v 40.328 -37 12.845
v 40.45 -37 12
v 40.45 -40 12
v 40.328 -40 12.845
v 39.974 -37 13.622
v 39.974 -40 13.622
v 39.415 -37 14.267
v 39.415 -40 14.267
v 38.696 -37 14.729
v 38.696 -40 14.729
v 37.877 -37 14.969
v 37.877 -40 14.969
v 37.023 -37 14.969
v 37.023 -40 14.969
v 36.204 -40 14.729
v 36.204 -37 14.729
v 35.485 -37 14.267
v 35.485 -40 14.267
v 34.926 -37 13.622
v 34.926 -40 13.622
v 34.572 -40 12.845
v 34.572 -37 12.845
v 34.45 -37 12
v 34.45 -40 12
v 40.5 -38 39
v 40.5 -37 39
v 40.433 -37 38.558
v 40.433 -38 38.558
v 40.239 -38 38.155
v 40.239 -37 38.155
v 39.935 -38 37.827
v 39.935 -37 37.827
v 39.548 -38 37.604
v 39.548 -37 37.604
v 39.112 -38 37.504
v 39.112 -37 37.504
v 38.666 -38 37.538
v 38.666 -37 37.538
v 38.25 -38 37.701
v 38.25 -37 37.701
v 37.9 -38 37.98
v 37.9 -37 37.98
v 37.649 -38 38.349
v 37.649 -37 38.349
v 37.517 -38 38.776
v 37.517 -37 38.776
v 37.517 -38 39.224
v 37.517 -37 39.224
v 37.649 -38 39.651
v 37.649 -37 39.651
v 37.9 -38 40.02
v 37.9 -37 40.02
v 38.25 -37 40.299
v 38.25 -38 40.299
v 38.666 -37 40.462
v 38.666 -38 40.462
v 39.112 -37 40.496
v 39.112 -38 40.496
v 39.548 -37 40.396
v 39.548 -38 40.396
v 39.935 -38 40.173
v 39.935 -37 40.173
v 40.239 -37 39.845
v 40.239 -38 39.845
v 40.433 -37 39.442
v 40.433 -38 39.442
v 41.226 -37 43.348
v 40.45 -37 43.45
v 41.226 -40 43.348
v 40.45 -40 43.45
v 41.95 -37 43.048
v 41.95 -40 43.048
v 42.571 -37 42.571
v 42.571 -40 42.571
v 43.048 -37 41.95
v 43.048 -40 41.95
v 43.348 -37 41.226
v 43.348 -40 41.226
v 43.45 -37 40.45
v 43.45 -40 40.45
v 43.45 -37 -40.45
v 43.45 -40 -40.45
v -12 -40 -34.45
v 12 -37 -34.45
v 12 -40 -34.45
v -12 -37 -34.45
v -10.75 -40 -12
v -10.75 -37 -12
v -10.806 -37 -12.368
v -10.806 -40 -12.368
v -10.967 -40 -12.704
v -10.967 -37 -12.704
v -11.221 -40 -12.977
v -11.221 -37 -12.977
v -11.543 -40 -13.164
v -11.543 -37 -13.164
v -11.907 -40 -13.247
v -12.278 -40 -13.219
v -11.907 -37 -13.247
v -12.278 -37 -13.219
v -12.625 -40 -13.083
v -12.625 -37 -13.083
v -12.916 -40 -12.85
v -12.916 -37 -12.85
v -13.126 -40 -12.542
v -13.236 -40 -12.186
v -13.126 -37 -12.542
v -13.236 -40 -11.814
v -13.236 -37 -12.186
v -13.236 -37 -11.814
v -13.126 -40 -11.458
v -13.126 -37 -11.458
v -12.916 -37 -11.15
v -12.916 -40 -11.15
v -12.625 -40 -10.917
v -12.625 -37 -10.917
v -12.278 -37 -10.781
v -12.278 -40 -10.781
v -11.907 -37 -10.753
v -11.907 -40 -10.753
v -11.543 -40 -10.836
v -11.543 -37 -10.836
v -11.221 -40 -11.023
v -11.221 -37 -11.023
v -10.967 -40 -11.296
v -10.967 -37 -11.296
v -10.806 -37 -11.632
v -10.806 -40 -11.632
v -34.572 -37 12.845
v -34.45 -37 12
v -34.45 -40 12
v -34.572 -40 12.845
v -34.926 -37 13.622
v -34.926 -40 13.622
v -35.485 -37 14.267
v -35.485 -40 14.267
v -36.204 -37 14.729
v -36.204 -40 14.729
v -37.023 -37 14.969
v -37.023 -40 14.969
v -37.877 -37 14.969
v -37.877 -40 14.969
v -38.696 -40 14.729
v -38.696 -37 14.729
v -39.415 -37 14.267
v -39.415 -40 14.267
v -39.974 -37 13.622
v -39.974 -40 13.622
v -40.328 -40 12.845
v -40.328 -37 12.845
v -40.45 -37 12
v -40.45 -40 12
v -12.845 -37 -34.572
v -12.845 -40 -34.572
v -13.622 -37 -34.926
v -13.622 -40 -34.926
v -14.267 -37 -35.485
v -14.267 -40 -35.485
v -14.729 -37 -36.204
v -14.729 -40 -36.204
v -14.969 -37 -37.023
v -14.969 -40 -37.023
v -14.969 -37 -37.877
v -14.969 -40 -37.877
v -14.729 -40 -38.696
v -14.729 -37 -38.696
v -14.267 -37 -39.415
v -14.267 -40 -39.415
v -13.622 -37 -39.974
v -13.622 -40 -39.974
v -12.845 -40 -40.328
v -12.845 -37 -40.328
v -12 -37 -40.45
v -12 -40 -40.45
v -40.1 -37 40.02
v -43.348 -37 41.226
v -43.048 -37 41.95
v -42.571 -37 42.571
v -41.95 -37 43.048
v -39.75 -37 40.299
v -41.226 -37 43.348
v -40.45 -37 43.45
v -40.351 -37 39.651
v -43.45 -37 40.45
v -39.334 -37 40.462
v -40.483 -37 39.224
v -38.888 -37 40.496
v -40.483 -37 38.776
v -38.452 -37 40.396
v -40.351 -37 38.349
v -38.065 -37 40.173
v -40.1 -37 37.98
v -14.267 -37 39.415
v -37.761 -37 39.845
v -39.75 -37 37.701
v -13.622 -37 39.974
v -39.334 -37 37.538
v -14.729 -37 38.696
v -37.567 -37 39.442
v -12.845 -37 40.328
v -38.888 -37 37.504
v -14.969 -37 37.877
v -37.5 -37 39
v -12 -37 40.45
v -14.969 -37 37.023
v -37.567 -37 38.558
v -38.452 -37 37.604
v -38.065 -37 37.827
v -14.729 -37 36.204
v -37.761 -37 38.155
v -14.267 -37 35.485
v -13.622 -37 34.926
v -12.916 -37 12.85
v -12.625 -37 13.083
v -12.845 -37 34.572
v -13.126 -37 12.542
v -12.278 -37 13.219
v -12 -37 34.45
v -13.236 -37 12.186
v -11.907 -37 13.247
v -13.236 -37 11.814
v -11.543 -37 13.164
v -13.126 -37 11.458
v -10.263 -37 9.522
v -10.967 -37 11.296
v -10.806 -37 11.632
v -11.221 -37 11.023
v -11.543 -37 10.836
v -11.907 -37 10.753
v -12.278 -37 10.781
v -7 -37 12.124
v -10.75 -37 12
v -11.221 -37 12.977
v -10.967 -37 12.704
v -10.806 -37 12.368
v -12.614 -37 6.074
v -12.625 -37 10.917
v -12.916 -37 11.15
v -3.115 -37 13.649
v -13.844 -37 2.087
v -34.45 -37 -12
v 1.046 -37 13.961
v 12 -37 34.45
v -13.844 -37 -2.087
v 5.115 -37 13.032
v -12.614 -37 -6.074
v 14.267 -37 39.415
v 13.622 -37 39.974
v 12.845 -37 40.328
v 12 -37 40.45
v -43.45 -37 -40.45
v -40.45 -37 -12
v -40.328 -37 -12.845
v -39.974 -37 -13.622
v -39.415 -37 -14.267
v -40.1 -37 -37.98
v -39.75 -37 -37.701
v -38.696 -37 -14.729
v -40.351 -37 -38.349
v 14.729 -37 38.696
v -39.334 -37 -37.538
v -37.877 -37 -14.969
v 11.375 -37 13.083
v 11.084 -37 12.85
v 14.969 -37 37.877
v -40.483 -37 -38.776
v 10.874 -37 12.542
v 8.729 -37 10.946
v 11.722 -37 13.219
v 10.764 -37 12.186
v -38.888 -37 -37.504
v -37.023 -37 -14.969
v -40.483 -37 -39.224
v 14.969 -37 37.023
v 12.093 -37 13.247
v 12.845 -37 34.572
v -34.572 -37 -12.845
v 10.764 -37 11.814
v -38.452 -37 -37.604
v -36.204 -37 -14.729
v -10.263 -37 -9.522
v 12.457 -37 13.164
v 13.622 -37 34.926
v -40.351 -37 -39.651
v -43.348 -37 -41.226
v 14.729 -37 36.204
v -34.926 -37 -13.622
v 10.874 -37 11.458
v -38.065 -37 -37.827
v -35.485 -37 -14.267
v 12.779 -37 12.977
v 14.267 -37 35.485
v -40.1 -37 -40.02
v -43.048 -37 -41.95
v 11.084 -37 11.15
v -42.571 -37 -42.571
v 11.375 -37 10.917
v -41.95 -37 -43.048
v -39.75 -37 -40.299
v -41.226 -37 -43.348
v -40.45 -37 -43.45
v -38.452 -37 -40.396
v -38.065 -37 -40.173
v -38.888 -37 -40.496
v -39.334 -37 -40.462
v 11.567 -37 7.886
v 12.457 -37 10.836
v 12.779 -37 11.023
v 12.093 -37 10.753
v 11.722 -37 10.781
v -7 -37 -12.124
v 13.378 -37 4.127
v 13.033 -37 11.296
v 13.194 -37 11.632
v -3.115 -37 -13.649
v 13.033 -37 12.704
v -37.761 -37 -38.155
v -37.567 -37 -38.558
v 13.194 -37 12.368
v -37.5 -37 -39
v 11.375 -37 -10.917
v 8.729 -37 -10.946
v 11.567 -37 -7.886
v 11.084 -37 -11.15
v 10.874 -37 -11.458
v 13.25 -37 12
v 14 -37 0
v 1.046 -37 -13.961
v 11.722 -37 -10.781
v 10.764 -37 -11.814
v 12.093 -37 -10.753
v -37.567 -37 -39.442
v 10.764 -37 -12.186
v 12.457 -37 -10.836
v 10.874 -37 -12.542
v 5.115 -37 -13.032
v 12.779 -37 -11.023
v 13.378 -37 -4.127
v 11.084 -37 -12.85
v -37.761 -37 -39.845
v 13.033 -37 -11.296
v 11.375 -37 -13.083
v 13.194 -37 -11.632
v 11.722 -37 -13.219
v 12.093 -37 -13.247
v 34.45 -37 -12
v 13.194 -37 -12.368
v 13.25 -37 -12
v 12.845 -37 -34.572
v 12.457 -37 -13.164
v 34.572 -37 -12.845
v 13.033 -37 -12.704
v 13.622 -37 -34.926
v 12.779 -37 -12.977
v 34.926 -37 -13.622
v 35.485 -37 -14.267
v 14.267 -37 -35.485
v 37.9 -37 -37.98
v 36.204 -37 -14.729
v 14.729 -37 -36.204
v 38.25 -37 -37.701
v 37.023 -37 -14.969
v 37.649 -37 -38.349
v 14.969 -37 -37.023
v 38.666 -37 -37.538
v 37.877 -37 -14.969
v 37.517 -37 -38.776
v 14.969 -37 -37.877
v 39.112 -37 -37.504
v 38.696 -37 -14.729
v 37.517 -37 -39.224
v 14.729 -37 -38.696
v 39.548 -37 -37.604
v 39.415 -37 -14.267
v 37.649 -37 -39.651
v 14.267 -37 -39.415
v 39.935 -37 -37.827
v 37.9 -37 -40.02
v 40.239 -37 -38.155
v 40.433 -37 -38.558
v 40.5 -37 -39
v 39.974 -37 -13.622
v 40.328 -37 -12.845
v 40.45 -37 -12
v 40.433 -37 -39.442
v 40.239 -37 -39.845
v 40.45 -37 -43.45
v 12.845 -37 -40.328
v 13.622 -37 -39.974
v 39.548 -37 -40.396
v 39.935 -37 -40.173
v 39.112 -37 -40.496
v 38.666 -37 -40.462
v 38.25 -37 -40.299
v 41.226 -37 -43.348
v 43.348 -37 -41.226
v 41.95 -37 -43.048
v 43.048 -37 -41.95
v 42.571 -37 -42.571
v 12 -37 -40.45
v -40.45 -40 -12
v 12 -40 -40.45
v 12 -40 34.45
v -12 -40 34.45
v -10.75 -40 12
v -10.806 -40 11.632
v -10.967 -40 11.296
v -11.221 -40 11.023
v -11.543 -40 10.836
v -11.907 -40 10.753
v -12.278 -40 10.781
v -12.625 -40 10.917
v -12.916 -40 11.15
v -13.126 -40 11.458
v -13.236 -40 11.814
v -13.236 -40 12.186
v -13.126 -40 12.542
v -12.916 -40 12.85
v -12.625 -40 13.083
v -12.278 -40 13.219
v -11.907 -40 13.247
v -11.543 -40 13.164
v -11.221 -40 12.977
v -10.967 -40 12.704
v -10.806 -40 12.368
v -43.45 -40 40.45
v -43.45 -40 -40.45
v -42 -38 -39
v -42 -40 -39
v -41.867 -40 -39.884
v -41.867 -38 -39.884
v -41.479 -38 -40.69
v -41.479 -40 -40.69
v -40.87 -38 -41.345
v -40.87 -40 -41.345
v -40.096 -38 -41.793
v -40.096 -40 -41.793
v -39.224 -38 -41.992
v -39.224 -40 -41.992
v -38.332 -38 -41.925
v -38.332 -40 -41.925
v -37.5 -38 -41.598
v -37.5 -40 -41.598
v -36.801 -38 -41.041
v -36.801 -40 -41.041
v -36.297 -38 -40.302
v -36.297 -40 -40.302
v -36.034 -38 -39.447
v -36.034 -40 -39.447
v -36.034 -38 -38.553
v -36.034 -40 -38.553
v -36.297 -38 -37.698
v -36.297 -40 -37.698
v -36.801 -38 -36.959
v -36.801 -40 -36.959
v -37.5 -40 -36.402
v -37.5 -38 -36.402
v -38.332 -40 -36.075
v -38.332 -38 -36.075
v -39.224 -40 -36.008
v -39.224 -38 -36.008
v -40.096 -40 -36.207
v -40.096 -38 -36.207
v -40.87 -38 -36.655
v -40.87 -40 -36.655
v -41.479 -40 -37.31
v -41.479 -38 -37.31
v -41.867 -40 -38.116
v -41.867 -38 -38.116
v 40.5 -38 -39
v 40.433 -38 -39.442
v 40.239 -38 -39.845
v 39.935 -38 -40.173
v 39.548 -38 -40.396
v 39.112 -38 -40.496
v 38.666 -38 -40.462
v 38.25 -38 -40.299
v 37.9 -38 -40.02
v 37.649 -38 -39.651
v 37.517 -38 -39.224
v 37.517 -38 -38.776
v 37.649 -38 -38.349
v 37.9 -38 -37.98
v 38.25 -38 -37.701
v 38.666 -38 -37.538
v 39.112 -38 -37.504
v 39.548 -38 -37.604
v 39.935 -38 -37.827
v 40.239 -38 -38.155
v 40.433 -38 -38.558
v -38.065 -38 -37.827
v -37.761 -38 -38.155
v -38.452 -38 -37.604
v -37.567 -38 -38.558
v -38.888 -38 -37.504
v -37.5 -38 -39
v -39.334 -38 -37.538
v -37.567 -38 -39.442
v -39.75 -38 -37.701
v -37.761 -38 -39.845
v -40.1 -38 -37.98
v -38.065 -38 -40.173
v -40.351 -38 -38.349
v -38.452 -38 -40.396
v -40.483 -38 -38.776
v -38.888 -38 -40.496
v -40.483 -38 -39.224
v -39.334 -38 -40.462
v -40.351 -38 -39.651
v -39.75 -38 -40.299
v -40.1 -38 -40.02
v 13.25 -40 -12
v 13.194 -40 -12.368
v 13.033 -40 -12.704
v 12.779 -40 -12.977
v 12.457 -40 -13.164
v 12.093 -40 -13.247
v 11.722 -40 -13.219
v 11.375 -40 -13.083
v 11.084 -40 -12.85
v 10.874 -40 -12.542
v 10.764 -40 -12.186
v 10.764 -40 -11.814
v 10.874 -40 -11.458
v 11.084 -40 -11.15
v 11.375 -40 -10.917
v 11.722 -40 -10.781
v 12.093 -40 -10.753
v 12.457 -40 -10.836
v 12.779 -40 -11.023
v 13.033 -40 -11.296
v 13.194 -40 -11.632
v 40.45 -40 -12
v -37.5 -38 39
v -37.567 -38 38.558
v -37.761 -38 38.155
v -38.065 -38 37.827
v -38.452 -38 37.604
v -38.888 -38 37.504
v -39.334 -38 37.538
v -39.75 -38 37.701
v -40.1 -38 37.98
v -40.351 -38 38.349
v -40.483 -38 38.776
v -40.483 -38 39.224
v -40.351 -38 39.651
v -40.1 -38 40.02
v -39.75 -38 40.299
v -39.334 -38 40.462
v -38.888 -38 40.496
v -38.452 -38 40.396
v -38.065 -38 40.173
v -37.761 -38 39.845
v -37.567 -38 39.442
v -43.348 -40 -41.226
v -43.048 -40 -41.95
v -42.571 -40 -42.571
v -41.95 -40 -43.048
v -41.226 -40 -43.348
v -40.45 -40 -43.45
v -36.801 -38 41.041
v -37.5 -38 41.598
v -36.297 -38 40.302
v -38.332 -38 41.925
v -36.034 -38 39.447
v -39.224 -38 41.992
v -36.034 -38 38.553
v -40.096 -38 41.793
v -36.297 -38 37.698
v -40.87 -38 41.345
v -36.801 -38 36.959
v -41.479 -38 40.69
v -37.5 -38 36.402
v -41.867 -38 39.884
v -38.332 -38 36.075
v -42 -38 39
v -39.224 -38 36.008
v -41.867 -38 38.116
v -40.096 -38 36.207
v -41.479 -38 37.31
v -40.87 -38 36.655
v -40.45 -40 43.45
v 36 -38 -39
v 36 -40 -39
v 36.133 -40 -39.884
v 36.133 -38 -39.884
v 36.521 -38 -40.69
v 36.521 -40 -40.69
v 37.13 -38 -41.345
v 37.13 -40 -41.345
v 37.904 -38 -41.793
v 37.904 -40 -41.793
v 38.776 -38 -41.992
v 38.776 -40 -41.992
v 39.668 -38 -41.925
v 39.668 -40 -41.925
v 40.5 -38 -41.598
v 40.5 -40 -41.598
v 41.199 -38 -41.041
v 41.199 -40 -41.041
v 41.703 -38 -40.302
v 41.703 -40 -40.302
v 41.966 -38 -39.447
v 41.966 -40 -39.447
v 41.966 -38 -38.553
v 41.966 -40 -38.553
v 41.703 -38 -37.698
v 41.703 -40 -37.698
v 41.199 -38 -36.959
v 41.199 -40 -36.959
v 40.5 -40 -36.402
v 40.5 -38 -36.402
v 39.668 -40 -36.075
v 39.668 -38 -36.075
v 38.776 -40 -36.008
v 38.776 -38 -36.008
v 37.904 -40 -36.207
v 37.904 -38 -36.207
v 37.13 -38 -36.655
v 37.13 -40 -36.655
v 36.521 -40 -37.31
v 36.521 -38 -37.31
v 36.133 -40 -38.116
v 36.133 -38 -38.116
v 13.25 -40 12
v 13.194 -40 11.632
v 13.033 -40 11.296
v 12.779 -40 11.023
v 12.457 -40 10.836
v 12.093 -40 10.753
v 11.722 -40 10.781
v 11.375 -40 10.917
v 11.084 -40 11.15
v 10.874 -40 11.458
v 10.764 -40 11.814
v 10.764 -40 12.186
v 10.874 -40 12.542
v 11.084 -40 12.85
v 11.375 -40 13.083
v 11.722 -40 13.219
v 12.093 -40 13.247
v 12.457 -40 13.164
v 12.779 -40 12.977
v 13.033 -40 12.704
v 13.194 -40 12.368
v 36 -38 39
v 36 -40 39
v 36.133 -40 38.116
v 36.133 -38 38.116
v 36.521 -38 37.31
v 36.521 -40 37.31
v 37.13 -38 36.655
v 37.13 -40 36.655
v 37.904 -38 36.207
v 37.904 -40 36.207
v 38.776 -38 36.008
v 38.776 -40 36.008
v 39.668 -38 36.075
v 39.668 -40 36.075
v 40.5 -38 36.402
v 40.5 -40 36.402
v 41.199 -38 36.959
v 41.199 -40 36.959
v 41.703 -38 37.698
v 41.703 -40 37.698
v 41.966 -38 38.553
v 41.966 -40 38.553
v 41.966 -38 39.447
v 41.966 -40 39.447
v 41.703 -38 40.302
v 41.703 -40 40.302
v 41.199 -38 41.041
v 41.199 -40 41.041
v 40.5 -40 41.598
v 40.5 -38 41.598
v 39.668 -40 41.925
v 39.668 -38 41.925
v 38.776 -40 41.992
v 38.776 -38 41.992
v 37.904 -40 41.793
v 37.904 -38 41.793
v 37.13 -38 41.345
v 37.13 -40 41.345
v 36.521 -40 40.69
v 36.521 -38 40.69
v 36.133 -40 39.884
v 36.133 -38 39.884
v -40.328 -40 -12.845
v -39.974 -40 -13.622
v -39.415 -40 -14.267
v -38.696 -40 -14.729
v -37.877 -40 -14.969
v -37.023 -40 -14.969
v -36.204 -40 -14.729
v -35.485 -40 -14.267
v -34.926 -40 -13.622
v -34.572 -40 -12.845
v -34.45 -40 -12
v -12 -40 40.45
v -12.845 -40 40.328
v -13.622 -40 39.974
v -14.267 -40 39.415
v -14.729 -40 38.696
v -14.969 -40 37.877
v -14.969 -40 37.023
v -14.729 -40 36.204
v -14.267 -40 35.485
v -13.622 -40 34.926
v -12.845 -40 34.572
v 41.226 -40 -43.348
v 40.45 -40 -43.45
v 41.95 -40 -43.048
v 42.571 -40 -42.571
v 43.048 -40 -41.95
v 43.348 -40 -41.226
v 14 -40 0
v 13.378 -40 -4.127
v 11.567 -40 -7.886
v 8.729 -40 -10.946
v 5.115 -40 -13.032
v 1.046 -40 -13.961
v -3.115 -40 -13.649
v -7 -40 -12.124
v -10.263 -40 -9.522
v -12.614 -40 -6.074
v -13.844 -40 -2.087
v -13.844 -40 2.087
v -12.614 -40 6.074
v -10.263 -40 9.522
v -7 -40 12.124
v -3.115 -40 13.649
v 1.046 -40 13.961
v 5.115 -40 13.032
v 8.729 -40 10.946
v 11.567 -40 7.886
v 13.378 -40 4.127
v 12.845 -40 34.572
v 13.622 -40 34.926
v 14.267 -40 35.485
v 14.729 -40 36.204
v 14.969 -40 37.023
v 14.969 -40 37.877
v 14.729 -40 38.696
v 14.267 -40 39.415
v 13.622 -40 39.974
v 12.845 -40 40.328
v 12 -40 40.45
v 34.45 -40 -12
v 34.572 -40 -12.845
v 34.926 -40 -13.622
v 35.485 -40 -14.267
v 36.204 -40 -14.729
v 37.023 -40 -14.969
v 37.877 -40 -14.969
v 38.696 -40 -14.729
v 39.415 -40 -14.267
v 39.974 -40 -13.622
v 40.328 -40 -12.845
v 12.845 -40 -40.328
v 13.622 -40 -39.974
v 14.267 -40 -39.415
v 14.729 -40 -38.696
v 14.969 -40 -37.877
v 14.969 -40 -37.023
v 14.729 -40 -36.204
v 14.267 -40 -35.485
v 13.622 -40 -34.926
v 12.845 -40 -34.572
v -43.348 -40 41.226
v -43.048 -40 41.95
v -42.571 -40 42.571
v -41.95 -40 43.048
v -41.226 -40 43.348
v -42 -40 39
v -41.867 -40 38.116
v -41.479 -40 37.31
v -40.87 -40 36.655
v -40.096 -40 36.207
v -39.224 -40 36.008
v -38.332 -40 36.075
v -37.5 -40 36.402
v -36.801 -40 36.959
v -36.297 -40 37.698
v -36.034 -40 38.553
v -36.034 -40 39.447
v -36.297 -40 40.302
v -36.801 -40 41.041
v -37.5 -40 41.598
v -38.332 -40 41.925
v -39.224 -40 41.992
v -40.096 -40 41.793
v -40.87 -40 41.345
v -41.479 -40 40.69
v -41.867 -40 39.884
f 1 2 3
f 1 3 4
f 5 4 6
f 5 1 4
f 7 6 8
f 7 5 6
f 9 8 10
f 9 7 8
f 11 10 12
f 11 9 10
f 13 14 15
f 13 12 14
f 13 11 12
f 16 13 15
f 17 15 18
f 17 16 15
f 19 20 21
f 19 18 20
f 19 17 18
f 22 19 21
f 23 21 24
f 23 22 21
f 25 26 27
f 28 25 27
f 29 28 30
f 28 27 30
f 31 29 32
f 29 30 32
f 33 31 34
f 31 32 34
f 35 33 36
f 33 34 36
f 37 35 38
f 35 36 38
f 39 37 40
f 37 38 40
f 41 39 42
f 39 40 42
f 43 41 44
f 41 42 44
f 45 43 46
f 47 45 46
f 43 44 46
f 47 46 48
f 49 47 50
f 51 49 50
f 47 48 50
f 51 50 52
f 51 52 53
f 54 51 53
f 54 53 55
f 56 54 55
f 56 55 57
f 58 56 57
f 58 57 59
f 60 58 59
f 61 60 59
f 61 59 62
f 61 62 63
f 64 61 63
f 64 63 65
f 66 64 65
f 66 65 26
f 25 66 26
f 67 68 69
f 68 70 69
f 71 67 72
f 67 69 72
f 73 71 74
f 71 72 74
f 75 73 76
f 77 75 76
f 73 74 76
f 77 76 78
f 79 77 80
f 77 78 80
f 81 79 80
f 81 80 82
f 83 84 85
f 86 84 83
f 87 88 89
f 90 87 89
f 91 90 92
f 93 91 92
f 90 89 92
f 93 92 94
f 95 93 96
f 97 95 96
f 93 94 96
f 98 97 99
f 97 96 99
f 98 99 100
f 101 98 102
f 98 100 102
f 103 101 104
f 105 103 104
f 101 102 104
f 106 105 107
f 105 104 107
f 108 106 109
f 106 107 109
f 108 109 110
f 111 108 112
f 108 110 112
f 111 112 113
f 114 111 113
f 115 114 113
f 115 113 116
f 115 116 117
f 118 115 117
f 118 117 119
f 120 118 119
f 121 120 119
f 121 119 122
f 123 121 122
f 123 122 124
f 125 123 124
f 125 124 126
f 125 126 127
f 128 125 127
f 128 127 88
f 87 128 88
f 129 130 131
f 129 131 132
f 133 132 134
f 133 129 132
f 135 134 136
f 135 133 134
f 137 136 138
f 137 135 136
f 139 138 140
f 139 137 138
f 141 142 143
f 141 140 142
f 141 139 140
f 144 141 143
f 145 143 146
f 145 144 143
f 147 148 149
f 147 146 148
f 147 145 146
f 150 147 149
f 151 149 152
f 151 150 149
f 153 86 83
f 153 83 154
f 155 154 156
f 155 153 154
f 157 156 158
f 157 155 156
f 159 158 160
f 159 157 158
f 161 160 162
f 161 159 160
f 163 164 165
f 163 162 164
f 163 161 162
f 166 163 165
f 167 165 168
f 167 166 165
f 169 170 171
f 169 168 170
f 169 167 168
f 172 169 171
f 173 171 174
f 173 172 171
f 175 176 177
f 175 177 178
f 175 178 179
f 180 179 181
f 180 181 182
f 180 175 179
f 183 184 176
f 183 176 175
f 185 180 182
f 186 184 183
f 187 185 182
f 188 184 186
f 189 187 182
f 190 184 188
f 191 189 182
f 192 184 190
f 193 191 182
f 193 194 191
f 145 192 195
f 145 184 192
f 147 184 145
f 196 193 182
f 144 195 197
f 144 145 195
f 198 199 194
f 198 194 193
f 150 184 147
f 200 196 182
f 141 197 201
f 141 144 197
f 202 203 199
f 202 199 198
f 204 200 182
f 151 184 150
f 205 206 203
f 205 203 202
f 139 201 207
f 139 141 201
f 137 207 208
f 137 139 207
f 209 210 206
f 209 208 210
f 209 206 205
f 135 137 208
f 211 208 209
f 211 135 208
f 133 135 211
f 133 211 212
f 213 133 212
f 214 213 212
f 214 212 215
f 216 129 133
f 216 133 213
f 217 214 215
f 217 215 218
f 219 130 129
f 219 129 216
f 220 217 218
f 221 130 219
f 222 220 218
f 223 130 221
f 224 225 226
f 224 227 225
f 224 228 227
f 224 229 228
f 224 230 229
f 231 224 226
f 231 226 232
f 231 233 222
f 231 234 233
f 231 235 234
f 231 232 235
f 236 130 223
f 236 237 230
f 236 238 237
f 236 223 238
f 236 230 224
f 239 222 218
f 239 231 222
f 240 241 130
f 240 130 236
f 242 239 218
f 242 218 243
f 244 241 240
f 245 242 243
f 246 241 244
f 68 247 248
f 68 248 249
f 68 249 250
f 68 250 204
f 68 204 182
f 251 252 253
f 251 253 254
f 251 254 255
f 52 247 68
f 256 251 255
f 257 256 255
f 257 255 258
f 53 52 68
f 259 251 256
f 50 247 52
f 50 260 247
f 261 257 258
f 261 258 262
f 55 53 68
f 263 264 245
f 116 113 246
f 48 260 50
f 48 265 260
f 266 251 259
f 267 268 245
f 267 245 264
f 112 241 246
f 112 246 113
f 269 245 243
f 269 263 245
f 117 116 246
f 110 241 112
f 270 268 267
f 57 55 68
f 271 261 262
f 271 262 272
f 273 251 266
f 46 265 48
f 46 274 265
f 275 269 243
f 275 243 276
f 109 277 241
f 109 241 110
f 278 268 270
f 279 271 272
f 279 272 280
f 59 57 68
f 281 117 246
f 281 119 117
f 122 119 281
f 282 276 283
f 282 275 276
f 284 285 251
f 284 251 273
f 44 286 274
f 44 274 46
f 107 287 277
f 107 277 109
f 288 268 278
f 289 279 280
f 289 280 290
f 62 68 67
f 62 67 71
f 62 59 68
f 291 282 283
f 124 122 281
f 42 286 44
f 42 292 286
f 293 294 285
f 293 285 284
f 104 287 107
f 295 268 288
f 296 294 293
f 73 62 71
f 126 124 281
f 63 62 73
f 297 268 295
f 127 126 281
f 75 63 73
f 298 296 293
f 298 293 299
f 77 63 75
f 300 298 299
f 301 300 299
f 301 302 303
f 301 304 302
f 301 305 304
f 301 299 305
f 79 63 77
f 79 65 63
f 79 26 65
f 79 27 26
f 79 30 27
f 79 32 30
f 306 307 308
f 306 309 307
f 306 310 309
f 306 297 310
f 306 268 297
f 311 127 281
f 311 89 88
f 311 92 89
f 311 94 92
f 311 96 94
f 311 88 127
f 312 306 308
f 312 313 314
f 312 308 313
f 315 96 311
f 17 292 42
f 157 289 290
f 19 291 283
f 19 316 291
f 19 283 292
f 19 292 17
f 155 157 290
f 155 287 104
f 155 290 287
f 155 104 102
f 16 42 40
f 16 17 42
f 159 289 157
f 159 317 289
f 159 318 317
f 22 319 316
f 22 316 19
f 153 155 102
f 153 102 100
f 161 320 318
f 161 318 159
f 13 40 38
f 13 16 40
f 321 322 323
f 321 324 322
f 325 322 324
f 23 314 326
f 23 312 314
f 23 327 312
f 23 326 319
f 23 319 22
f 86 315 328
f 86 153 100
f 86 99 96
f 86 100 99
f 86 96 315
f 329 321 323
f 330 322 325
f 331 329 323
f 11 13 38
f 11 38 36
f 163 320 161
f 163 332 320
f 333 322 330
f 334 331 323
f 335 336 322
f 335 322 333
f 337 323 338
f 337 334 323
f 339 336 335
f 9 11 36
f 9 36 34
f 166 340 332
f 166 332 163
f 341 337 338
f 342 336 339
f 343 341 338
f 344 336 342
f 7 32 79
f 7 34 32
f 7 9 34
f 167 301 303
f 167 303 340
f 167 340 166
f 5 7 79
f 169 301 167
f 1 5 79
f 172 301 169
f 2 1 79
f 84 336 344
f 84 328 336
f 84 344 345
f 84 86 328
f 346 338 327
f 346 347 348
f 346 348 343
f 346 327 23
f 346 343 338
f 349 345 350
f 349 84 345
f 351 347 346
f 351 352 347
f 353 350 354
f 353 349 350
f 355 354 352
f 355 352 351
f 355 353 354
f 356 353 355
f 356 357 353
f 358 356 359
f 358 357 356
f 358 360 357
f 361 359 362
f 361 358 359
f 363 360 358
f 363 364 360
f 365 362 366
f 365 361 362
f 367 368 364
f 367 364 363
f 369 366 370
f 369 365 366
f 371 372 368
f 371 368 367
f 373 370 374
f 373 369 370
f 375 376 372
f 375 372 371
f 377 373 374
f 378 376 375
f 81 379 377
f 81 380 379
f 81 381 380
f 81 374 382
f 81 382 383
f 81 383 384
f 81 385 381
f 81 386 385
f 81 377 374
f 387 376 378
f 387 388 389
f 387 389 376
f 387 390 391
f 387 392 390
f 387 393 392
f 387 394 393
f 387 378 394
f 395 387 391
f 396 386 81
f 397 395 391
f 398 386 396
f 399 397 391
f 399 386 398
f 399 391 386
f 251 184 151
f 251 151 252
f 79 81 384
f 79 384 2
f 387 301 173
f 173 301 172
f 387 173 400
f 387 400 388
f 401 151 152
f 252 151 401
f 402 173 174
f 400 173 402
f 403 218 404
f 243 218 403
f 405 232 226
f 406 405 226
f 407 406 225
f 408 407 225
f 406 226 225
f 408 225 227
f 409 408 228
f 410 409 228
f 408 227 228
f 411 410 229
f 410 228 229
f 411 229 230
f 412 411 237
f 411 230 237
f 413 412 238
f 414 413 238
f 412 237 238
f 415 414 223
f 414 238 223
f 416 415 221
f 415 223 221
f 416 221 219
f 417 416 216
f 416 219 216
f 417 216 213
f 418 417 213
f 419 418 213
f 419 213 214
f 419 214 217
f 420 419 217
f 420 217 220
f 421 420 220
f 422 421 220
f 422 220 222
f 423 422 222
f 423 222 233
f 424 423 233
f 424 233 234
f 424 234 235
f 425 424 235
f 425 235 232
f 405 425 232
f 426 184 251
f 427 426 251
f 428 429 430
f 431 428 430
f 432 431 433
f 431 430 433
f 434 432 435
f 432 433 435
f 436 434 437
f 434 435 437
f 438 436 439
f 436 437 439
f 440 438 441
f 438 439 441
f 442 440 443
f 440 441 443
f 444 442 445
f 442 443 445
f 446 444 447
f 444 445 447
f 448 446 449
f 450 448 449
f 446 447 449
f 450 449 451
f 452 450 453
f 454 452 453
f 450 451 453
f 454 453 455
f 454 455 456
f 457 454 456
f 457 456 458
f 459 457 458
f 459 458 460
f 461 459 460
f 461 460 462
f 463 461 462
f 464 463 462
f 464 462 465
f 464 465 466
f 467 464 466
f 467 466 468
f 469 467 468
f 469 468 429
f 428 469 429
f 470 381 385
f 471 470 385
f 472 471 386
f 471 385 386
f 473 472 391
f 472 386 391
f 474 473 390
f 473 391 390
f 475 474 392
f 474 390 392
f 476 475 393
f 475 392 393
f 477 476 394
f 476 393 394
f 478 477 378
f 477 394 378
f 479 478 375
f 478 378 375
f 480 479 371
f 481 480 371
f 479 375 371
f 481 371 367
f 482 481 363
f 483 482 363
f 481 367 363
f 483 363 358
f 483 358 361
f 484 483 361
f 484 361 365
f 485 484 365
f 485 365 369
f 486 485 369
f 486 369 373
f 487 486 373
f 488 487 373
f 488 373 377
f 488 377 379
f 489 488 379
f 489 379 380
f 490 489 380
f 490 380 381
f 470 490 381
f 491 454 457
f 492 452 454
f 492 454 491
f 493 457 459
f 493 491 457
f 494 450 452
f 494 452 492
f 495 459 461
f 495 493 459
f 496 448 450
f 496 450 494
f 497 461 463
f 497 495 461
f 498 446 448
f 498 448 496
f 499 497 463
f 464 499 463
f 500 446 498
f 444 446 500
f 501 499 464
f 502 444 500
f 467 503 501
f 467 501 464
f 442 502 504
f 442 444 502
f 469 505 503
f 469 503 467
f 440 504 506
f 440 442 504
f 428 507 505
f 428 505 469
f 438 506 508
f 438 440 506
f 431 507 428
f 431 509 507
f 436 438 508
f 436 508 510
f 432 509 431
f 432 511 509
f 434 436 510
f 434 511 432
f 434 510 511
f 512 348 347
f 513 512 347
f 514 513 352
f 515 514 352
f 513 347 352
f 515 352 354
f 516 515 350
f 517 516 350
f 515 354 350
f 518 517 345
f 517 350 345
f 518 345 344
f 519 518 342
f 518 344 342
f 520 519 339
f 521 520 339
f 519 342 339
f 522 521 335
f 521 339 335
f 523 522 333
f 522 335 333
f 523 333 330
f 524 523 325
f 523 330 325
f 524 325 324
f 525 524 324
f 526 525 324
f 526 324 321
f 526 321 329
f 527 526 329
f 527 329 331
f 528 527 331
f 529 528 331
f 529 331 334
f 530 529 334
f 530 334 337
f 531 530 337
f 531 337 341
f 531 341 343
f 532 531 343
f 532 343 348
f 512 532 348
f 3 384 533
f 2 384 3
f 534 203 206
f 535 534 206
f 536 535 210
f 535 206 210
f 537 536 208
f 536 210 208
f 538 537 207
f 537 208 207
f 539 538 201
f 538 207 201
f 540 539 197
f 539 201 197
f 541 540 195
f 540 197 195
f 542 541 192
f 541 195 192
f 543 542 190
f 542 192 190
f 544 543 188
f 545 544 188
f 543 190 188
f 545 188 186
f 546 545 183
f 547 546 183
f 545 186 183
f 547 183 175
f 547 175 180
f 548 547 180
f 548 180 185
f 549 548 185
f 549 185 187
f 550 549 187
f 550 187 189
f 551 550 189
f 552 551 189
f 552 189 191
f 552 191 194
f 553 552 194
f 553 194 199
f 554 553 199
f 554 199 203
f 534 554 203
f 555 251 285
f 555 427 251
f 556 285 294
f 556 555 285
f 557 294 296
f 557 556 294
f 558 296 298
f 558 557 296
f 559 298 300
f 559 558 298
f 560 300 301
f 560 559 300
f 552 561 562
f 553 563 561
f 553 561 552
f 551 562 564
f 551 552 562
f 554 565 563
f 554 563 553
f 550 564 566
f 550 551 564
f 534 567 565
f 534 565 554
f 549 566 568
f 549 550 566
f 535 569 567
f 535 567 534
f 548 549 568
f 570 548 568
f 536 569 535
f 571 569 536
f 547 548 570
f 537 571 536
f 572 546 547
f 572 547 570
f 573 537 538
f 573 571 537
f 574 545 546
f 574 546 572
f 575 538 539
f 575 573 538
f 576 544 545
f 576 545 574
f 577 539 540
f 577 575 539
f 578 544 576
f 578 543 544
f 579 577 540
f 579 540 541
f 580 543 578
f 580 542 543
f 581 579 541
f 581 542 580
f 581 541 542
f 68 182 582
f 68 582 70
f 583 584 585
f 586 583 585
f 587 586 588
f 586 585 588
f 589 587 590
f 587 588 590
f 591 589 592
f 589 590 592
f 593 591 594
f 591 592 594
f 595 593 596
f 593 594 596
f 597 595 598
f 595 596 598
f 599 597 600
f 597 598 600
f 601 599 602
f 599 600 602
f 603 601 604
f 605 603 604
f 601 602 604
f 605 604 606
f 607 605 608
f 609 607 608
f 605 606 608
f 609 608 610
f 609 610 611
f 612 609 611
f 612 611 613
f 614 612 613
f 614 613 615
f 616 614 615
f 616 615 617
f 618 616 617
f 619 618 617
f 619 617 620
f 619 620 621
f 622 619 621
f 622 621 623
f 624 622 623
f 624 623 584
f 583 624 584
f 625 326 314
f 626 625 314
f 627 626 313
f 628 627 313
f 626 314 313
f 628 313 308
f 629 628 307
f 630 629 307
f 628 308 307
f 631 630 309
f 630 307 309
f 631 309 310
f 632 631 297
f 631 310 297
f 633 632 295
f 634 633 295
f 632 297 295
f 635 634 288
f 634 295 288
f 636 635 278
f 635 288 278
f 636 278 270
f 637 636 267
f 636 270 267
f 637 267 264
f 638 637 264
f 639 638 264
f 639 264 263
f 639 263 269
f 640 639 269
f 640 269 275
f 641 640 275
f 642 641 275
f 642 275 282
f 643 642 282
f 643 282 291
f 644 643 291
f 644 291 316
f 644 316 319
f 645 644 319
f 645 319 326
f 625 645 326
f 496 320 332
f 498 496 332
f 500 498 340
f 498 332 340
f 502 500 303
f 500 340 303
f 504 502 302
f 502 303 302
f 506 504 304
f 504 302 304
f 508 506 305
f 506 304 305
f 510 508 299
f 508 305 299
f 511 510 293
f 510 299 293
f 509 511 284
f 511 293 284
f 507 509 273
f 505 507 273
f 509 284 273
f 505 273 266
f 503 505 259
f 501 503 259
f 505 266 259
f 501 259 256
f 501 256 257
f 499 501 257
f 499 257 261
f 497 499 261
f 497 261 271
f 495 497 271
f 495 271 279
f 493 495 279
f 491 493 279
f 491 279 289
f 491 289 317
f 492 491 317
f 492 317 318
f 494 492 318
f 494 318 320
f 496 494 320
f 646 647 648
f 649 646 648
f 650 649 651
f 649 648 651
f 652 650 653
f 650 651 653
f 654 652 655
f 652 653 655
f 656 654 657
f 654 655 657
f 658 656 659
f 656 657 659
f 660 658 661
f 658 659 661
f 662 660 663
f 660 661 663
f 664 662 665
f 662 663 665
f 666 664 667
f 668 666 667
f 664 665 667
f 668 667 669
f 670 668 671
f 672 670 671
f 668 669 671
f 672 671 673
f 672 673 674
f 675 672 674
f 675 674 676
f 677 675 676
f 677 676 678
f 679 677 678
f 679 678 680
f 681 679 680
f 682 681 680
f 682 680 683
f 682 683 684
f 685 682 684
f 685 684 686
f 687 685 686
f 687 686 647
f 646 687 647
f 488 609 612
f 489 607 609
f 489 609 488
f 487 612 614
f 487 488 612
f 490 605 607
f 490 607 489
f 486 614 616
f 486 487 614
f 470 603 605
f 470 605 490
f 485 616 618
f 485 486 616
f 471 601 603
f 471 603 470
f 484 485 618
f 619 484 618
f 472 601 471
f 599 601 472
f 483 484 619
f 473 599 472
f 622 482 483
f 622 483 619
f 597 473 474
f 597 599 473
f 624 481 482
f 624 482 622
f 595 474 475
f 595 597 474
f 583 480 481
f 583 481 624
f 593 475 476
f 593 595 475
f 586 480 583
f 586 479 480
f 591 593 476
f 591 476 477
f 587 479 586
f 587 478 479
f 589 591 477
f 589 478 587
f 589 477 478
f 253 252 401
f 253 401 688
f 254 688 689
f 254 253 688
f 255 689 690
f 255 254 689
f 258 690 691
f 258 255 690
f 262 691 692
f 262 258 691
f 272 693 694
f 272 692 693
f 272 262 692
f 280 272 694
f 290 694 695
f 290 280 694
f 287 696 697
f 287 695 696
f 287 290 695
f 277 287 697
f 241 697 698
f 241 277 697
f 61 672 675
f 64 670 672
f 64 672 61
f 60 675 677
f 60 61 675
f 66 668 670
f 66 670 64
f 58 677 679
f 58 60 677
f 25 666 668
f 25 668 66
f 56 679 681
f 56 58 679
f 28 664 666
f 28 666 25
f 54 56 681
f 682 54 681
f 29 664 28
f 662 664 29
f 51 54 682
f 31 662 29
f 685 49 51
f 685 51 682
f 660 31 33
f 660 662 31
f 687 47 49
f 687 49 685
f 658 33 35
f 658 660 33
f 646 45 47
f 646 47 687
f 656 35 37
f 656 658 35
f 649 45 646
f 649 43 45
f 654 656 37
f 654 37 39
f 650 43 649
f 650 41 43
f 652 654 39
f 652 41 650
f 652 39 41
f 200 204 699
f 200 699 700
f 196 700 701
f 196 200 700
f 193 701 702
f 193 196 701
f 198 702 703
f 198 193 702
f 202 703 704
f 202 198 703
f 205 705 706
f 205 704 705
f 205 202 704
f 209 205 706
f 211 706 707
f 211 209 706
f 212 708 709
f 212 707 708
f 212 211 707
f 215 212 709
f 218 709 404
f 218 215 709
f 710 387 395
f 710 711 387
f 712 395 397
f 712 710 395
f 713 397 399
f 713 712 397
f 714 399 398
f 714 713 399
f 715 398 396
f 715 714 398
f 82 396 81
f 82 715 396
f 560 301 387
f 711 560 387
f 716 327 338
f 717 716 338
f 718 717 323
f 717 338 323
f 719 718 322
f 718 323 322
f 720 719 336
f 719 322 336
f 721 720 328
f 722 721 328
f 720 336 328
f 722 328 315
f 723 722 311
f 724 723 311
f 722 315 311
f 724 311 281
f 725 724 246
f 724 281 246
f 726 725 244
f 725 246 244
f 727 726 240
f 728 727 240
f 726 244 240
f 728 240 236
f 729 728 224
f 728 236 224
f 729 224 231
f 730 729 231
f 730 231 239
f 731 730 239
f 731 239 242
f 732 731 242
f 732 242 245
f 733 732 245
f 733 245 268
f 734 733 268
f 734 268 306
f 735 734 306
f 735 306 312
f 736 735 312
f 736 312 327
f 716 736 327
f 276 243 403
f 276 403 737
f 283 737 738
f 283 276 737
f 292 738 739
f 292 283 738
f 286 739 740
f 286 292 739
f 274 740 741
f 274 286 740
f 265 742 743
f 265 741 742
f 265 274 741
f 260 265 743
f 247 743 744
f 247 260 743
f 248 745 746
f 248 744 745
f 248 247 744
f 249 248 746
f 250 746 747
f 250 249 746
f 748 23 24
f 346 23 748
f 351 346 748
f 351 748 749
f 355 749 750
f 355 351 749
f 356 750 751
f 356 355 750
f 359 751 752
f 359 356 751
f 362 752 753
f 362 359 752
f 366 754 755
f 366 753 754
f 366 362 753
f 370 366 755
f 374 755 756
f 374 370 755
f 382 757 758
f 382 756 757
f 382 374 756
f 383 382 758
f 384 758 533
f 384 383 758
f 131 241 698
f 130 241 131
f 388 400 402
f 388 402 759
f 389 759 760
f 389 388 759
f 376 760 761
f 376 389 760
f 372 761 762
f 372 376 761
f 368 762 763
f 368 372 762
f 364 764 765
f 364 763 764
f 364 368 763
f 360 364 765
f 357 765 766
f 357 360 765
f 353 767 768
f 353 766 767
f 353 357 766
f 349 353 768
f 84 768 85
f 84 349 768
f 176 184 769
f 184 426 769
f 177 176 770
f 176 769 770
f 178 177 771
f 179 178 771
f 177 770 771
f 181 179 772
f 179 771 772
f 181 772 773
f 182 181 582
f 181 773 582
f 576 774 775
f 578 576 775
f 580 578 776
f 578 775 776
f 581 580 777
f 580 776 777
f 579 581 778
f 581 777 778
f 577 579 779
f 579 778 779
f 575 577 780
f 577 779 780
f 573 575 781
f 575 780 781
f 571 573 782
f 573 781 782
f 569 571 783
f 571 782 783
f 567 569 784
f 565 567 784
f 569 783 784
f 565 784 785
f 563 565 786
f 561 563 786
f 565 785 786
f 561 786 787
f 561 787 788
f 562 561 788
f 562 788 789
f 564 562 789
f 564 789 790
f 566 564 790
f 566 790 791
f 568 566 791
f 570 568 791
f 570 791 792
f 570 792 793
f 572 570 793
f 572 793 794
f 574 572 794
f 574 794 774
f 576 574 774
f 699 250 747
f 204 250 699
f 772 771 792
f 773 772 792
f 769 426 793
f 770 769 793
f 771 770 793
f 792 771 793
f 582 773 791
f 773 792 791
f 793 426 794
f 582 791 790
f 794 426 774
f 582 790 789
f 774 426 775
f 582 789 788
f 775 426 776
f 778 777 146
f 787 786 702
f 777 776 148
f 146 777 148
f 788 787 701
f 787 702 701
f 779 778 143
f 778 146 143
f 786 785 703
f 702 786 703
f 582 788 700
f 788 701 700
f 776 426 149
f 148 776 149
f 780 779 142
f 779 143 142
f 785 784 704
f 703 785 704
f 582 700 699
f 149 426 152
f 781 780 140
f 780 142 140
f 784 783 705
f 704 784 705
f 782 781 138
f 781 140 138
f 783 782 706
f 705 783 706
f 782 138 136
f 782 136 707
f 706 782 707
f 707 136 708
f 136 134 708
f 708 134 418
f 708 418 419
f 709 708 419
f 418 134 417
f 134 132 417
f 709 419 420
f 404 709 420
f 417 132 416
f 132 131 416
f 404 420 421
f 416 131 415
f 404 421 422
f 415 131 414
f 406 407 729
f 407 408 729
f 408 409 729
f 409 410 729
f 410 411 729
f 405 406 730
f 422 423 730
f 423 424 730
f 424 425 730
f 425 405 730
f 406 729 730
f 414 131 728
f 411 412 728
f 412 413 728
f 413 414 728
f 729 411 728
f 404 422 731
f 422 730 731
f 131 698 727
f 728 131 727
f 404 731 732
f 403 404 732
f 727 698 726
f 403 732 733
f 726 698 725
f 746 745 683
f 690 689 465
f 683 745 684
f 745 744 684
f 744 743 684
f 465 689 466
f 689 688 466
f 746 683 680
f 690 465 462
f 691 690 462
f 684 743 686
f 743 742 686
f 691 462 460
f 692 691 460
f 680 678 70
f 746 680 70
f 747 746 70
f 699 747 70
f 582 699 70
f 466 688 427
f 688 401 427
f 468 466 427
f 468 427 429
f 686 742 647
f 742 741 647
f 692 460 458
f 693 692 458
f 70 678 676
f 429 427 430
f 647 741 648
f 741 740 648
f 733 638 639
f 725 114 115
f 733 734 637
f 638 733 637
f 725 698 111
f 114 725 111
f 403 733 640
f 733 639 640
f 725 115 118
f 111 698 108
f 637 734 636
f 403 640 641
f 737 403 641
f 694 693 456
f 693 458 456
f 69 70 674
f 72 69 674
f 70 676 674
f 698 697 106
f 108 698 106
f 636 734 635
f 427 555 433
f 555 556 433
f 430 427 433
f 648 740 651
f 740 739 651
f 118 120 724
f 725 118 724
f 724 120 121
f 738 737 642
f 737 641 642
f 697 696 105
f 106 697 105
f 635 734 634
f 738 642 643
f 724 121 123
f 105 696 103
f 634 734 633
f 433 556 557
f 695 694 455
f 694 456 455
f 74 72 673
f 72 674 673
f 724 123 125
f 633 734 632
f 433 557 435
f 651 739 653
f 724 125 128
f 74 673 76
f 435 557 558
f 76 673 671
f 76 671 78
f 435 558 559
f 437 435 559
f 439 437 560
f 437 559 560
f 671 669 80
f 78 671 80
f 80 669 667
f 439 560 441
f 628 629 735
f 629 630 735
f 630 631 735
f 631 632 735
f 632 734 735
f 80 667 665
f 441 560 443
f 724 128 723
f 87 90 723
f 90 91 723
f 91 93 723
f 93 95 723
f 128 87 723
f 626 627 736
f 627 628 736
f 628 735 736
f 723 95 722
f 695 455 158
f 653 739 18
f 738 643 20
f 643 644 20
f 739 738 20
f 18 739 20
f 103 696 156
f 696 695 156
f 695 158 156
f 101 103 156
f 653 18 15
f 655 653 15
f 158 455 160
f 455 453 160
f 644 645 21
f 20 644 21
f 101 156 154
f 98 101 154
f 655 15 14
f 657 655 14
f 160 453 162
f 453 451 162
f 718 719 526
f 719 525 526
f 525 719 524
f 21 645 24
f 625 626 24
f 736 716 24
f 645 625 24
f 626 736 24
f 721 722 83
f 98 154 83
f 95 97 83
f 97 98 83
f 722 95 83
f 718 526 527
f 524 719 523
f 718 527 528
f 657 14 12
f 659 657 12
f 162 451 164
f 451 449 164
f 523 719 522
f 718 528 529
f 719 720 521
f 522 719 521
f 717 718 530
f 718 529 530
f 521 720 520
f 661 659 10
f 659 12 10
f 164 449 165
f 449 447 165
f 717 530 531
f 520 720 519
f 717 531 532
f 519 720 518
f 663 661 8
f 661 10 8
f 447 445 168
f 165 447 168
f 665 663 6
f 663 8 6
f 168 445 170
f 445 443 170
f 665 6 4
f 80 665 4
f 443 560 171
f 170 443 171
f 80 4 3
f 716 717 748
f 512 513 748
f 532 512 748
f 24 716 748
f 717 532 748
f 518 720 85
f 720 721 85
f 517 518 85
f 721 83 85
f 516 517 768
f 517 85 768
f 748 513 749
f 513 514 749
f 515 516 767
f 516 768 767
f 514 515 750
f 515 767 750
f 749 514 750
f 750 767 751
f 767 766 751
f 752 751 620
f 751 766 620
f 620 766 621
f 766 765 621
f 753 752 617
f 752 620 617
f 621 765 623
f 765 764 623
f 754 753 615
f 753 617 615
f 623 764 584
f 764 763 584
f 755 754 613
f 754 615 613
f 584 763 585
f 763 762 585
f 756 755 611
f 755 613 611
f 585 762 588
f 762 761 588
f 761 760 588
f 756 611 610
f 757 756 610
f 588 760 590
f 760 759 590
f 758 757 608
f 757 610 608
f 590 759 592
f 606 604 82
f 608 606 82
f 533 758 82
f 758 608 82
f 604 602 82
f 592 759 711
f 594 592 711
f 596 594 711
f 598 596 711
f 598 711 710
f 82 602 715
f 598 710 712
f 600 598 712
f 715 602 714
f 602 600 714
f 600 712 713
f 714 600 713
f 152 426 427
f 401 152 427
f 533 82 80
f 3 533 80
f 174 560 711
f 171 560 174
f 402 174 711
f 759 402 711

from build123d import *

# Parameters (mm, degrees)
SKETCH_1_W                     = 86.9
SKETCH_1_H                     = 86.9
EXTRUDE_1_DEPTH                = 3
HOLE_WIZARD_M2_5_1_D           = 3
HOLE_WIZARD_M2_5_1_DEPTH       = 3
HOLE_WIZARD_M2_5_1_CBORE_D     = 6
HOLE_WIZARD_M2_5_1_CBORE_DEPTH = 2
HOLE_WIZARD_2_0_2_1_D          = 2
HOLE_WIZARD_2_0_2_1_DEPTH      = 3
HOLE_WIZARD_2_5_2_5_1_D        = 2.5
HOLE_WIZARD_2_5_2_5_1_DEPTH    = 3
FILLET_1_R                     = 3
SKETCH_8_R                     = 14
CUT_EXTRUDE_1_DEPTH            = 4


with BuildPart() as part:
    # 草圖1 → 填料-伸長1 (new body)
    with BuildSketch(Plane(origin=(0, -37, 0), x_dir=(1, 0, 0), z_dir=(0, 1, 0))):
        Rectangle(SKETCH_1_W, SKETCH_1_H)
    extrude(amount=-EXTRUDE_1_DEPTH)

    # M2.5 六角頭機械螺釘的柱孔1
    with Locations(Plane(origin=(0, -40, 0), x_dir=(-1, 0, 0), z_dir=(0, -1, 0))):
        with Locations((39, 39), (-39, 39), (-39, -39), (39, -39)):
            CounterBoreHole(HOLE_WIZARD_M2_5_1_D / 2, HOLE_WIZARD_M2_5_1_CBORE_D / 2, HOLE_WIZARD_M2_5_1_CBORE_DEPTH, depth=HOLE_WIZARD_M2_5_1_DEPTH)

    # Ø2.0 (2) 直徑孔1
    with Locations(Plane(origin=(0, -37, 0), x_dir=(1, 0, 0), z_dir=(0, 1, 0))):
        with Locations((5, -10), (0, -10), (-5, -10), (-10, -5), (-10, 0), (-10, 5), (-5, 10), (0, 10), (5, 10), (10, 5), (10, 0), (10, -5), (5, -5), (0, -5), (-5, -5), (-5, 0), (-5, 5), (0, 5), (5, 5), (5, 0), (0, 0), (-37.5, 3), (-37.5, 0), (-37.5, -3), (3, 37.5), (0, 37.5), (-3, 37.5), (37.5, -3), (37.5, 0), (37.5, 3), (-3, -37.5), (0, -37.5), (3, -37.5)):
            Hole(HOLE_WIZARD_2_0_2_1_D / 2, depth=HOLE_WIZARD_2_0_2_1_DEPTH)

    # Ø2.5 (2.5) 直徑孔1
    with Locations(Plane(origin=(0, -40, 0), x_dir=(-1, 0, 0), z_dir=(0, -1, 0))):
        with Locations((12, 12), (-12, 12), (12, -12), (-12, -12)):
            Hole(HOLE_WIZARD_2_5_2_5_1_D / 2, depth=HOLE_WIZARD_2_5_2_5_1_DEPTH)

    # 圓角1
    fillet_1_edges = [part.edges().sort_by_distance(p)[0] for p in [
        (-43.45, -38.5, -43.45),
        (43.45, -38.5, -43.45),
        (43.45, -38.5, 43.45),
        (-43.45, -38.5, 43.45),
    ]]
    fillet(fillet_1_edges, radius=FILLET_1_R)

    # 草圖8 → 除料-伸長1 (cut, through all)
    with BuildSketch(Plane(origin=(0, -37, 0), x_dir=(1, 0, 0), z_dir=(0, 1, 0))):
        Circle(SKETCH_8_R)
        with BuildLine():
            Line((-40.45, -12), (-40.45, 12))
            ThreePointArc((-40.45, 12), (-37.45, 15), (-34.45, 12))
            Line((-34.45, 12), (-34.45, -12))
            ThreePointArc((-34.45, -12), (-37.45, -15), (-40.45, -12))
        make_face()
        with BuildLine():
            Line((-12, 40.45), (12, 40.45))
            ThreePointArc((12, 40.45), (15, 37.45), (12, 34.45))
            Line((12, 34.45), (-12, 34.45))
            ThreePointArc((-12, 34.45), (-15, 37.45), (-12, 40.45))
        make_face()
        with BuildLine():
            Line((40.45, 12), (40.45, -12))
            ThreePointArc((40.45, -12), (37.45, -15), (34.45, -12))
            Line((34.45, -12), (34.45, 12))
            ThreePointArc((34.45, 12), (37.45, 15), (40.45, 12))
        make_face()
        with BuildLine():
            Line((12, -40.45), (-12, -40.45))
            ThreePointArc((-12, -40.45), (-15, -37.45), (-12, -34.45))
            Line((-12, -34.45), (12, -34.45))
            ThreePointArc((12, -34.45), (15, -37.45), (12, -40.45))
        make_face()
    extrude(amount=-CUT_EXTRUDE_1_DEPTH, mode=Mode.SUBTRACT)


solid = part.part
